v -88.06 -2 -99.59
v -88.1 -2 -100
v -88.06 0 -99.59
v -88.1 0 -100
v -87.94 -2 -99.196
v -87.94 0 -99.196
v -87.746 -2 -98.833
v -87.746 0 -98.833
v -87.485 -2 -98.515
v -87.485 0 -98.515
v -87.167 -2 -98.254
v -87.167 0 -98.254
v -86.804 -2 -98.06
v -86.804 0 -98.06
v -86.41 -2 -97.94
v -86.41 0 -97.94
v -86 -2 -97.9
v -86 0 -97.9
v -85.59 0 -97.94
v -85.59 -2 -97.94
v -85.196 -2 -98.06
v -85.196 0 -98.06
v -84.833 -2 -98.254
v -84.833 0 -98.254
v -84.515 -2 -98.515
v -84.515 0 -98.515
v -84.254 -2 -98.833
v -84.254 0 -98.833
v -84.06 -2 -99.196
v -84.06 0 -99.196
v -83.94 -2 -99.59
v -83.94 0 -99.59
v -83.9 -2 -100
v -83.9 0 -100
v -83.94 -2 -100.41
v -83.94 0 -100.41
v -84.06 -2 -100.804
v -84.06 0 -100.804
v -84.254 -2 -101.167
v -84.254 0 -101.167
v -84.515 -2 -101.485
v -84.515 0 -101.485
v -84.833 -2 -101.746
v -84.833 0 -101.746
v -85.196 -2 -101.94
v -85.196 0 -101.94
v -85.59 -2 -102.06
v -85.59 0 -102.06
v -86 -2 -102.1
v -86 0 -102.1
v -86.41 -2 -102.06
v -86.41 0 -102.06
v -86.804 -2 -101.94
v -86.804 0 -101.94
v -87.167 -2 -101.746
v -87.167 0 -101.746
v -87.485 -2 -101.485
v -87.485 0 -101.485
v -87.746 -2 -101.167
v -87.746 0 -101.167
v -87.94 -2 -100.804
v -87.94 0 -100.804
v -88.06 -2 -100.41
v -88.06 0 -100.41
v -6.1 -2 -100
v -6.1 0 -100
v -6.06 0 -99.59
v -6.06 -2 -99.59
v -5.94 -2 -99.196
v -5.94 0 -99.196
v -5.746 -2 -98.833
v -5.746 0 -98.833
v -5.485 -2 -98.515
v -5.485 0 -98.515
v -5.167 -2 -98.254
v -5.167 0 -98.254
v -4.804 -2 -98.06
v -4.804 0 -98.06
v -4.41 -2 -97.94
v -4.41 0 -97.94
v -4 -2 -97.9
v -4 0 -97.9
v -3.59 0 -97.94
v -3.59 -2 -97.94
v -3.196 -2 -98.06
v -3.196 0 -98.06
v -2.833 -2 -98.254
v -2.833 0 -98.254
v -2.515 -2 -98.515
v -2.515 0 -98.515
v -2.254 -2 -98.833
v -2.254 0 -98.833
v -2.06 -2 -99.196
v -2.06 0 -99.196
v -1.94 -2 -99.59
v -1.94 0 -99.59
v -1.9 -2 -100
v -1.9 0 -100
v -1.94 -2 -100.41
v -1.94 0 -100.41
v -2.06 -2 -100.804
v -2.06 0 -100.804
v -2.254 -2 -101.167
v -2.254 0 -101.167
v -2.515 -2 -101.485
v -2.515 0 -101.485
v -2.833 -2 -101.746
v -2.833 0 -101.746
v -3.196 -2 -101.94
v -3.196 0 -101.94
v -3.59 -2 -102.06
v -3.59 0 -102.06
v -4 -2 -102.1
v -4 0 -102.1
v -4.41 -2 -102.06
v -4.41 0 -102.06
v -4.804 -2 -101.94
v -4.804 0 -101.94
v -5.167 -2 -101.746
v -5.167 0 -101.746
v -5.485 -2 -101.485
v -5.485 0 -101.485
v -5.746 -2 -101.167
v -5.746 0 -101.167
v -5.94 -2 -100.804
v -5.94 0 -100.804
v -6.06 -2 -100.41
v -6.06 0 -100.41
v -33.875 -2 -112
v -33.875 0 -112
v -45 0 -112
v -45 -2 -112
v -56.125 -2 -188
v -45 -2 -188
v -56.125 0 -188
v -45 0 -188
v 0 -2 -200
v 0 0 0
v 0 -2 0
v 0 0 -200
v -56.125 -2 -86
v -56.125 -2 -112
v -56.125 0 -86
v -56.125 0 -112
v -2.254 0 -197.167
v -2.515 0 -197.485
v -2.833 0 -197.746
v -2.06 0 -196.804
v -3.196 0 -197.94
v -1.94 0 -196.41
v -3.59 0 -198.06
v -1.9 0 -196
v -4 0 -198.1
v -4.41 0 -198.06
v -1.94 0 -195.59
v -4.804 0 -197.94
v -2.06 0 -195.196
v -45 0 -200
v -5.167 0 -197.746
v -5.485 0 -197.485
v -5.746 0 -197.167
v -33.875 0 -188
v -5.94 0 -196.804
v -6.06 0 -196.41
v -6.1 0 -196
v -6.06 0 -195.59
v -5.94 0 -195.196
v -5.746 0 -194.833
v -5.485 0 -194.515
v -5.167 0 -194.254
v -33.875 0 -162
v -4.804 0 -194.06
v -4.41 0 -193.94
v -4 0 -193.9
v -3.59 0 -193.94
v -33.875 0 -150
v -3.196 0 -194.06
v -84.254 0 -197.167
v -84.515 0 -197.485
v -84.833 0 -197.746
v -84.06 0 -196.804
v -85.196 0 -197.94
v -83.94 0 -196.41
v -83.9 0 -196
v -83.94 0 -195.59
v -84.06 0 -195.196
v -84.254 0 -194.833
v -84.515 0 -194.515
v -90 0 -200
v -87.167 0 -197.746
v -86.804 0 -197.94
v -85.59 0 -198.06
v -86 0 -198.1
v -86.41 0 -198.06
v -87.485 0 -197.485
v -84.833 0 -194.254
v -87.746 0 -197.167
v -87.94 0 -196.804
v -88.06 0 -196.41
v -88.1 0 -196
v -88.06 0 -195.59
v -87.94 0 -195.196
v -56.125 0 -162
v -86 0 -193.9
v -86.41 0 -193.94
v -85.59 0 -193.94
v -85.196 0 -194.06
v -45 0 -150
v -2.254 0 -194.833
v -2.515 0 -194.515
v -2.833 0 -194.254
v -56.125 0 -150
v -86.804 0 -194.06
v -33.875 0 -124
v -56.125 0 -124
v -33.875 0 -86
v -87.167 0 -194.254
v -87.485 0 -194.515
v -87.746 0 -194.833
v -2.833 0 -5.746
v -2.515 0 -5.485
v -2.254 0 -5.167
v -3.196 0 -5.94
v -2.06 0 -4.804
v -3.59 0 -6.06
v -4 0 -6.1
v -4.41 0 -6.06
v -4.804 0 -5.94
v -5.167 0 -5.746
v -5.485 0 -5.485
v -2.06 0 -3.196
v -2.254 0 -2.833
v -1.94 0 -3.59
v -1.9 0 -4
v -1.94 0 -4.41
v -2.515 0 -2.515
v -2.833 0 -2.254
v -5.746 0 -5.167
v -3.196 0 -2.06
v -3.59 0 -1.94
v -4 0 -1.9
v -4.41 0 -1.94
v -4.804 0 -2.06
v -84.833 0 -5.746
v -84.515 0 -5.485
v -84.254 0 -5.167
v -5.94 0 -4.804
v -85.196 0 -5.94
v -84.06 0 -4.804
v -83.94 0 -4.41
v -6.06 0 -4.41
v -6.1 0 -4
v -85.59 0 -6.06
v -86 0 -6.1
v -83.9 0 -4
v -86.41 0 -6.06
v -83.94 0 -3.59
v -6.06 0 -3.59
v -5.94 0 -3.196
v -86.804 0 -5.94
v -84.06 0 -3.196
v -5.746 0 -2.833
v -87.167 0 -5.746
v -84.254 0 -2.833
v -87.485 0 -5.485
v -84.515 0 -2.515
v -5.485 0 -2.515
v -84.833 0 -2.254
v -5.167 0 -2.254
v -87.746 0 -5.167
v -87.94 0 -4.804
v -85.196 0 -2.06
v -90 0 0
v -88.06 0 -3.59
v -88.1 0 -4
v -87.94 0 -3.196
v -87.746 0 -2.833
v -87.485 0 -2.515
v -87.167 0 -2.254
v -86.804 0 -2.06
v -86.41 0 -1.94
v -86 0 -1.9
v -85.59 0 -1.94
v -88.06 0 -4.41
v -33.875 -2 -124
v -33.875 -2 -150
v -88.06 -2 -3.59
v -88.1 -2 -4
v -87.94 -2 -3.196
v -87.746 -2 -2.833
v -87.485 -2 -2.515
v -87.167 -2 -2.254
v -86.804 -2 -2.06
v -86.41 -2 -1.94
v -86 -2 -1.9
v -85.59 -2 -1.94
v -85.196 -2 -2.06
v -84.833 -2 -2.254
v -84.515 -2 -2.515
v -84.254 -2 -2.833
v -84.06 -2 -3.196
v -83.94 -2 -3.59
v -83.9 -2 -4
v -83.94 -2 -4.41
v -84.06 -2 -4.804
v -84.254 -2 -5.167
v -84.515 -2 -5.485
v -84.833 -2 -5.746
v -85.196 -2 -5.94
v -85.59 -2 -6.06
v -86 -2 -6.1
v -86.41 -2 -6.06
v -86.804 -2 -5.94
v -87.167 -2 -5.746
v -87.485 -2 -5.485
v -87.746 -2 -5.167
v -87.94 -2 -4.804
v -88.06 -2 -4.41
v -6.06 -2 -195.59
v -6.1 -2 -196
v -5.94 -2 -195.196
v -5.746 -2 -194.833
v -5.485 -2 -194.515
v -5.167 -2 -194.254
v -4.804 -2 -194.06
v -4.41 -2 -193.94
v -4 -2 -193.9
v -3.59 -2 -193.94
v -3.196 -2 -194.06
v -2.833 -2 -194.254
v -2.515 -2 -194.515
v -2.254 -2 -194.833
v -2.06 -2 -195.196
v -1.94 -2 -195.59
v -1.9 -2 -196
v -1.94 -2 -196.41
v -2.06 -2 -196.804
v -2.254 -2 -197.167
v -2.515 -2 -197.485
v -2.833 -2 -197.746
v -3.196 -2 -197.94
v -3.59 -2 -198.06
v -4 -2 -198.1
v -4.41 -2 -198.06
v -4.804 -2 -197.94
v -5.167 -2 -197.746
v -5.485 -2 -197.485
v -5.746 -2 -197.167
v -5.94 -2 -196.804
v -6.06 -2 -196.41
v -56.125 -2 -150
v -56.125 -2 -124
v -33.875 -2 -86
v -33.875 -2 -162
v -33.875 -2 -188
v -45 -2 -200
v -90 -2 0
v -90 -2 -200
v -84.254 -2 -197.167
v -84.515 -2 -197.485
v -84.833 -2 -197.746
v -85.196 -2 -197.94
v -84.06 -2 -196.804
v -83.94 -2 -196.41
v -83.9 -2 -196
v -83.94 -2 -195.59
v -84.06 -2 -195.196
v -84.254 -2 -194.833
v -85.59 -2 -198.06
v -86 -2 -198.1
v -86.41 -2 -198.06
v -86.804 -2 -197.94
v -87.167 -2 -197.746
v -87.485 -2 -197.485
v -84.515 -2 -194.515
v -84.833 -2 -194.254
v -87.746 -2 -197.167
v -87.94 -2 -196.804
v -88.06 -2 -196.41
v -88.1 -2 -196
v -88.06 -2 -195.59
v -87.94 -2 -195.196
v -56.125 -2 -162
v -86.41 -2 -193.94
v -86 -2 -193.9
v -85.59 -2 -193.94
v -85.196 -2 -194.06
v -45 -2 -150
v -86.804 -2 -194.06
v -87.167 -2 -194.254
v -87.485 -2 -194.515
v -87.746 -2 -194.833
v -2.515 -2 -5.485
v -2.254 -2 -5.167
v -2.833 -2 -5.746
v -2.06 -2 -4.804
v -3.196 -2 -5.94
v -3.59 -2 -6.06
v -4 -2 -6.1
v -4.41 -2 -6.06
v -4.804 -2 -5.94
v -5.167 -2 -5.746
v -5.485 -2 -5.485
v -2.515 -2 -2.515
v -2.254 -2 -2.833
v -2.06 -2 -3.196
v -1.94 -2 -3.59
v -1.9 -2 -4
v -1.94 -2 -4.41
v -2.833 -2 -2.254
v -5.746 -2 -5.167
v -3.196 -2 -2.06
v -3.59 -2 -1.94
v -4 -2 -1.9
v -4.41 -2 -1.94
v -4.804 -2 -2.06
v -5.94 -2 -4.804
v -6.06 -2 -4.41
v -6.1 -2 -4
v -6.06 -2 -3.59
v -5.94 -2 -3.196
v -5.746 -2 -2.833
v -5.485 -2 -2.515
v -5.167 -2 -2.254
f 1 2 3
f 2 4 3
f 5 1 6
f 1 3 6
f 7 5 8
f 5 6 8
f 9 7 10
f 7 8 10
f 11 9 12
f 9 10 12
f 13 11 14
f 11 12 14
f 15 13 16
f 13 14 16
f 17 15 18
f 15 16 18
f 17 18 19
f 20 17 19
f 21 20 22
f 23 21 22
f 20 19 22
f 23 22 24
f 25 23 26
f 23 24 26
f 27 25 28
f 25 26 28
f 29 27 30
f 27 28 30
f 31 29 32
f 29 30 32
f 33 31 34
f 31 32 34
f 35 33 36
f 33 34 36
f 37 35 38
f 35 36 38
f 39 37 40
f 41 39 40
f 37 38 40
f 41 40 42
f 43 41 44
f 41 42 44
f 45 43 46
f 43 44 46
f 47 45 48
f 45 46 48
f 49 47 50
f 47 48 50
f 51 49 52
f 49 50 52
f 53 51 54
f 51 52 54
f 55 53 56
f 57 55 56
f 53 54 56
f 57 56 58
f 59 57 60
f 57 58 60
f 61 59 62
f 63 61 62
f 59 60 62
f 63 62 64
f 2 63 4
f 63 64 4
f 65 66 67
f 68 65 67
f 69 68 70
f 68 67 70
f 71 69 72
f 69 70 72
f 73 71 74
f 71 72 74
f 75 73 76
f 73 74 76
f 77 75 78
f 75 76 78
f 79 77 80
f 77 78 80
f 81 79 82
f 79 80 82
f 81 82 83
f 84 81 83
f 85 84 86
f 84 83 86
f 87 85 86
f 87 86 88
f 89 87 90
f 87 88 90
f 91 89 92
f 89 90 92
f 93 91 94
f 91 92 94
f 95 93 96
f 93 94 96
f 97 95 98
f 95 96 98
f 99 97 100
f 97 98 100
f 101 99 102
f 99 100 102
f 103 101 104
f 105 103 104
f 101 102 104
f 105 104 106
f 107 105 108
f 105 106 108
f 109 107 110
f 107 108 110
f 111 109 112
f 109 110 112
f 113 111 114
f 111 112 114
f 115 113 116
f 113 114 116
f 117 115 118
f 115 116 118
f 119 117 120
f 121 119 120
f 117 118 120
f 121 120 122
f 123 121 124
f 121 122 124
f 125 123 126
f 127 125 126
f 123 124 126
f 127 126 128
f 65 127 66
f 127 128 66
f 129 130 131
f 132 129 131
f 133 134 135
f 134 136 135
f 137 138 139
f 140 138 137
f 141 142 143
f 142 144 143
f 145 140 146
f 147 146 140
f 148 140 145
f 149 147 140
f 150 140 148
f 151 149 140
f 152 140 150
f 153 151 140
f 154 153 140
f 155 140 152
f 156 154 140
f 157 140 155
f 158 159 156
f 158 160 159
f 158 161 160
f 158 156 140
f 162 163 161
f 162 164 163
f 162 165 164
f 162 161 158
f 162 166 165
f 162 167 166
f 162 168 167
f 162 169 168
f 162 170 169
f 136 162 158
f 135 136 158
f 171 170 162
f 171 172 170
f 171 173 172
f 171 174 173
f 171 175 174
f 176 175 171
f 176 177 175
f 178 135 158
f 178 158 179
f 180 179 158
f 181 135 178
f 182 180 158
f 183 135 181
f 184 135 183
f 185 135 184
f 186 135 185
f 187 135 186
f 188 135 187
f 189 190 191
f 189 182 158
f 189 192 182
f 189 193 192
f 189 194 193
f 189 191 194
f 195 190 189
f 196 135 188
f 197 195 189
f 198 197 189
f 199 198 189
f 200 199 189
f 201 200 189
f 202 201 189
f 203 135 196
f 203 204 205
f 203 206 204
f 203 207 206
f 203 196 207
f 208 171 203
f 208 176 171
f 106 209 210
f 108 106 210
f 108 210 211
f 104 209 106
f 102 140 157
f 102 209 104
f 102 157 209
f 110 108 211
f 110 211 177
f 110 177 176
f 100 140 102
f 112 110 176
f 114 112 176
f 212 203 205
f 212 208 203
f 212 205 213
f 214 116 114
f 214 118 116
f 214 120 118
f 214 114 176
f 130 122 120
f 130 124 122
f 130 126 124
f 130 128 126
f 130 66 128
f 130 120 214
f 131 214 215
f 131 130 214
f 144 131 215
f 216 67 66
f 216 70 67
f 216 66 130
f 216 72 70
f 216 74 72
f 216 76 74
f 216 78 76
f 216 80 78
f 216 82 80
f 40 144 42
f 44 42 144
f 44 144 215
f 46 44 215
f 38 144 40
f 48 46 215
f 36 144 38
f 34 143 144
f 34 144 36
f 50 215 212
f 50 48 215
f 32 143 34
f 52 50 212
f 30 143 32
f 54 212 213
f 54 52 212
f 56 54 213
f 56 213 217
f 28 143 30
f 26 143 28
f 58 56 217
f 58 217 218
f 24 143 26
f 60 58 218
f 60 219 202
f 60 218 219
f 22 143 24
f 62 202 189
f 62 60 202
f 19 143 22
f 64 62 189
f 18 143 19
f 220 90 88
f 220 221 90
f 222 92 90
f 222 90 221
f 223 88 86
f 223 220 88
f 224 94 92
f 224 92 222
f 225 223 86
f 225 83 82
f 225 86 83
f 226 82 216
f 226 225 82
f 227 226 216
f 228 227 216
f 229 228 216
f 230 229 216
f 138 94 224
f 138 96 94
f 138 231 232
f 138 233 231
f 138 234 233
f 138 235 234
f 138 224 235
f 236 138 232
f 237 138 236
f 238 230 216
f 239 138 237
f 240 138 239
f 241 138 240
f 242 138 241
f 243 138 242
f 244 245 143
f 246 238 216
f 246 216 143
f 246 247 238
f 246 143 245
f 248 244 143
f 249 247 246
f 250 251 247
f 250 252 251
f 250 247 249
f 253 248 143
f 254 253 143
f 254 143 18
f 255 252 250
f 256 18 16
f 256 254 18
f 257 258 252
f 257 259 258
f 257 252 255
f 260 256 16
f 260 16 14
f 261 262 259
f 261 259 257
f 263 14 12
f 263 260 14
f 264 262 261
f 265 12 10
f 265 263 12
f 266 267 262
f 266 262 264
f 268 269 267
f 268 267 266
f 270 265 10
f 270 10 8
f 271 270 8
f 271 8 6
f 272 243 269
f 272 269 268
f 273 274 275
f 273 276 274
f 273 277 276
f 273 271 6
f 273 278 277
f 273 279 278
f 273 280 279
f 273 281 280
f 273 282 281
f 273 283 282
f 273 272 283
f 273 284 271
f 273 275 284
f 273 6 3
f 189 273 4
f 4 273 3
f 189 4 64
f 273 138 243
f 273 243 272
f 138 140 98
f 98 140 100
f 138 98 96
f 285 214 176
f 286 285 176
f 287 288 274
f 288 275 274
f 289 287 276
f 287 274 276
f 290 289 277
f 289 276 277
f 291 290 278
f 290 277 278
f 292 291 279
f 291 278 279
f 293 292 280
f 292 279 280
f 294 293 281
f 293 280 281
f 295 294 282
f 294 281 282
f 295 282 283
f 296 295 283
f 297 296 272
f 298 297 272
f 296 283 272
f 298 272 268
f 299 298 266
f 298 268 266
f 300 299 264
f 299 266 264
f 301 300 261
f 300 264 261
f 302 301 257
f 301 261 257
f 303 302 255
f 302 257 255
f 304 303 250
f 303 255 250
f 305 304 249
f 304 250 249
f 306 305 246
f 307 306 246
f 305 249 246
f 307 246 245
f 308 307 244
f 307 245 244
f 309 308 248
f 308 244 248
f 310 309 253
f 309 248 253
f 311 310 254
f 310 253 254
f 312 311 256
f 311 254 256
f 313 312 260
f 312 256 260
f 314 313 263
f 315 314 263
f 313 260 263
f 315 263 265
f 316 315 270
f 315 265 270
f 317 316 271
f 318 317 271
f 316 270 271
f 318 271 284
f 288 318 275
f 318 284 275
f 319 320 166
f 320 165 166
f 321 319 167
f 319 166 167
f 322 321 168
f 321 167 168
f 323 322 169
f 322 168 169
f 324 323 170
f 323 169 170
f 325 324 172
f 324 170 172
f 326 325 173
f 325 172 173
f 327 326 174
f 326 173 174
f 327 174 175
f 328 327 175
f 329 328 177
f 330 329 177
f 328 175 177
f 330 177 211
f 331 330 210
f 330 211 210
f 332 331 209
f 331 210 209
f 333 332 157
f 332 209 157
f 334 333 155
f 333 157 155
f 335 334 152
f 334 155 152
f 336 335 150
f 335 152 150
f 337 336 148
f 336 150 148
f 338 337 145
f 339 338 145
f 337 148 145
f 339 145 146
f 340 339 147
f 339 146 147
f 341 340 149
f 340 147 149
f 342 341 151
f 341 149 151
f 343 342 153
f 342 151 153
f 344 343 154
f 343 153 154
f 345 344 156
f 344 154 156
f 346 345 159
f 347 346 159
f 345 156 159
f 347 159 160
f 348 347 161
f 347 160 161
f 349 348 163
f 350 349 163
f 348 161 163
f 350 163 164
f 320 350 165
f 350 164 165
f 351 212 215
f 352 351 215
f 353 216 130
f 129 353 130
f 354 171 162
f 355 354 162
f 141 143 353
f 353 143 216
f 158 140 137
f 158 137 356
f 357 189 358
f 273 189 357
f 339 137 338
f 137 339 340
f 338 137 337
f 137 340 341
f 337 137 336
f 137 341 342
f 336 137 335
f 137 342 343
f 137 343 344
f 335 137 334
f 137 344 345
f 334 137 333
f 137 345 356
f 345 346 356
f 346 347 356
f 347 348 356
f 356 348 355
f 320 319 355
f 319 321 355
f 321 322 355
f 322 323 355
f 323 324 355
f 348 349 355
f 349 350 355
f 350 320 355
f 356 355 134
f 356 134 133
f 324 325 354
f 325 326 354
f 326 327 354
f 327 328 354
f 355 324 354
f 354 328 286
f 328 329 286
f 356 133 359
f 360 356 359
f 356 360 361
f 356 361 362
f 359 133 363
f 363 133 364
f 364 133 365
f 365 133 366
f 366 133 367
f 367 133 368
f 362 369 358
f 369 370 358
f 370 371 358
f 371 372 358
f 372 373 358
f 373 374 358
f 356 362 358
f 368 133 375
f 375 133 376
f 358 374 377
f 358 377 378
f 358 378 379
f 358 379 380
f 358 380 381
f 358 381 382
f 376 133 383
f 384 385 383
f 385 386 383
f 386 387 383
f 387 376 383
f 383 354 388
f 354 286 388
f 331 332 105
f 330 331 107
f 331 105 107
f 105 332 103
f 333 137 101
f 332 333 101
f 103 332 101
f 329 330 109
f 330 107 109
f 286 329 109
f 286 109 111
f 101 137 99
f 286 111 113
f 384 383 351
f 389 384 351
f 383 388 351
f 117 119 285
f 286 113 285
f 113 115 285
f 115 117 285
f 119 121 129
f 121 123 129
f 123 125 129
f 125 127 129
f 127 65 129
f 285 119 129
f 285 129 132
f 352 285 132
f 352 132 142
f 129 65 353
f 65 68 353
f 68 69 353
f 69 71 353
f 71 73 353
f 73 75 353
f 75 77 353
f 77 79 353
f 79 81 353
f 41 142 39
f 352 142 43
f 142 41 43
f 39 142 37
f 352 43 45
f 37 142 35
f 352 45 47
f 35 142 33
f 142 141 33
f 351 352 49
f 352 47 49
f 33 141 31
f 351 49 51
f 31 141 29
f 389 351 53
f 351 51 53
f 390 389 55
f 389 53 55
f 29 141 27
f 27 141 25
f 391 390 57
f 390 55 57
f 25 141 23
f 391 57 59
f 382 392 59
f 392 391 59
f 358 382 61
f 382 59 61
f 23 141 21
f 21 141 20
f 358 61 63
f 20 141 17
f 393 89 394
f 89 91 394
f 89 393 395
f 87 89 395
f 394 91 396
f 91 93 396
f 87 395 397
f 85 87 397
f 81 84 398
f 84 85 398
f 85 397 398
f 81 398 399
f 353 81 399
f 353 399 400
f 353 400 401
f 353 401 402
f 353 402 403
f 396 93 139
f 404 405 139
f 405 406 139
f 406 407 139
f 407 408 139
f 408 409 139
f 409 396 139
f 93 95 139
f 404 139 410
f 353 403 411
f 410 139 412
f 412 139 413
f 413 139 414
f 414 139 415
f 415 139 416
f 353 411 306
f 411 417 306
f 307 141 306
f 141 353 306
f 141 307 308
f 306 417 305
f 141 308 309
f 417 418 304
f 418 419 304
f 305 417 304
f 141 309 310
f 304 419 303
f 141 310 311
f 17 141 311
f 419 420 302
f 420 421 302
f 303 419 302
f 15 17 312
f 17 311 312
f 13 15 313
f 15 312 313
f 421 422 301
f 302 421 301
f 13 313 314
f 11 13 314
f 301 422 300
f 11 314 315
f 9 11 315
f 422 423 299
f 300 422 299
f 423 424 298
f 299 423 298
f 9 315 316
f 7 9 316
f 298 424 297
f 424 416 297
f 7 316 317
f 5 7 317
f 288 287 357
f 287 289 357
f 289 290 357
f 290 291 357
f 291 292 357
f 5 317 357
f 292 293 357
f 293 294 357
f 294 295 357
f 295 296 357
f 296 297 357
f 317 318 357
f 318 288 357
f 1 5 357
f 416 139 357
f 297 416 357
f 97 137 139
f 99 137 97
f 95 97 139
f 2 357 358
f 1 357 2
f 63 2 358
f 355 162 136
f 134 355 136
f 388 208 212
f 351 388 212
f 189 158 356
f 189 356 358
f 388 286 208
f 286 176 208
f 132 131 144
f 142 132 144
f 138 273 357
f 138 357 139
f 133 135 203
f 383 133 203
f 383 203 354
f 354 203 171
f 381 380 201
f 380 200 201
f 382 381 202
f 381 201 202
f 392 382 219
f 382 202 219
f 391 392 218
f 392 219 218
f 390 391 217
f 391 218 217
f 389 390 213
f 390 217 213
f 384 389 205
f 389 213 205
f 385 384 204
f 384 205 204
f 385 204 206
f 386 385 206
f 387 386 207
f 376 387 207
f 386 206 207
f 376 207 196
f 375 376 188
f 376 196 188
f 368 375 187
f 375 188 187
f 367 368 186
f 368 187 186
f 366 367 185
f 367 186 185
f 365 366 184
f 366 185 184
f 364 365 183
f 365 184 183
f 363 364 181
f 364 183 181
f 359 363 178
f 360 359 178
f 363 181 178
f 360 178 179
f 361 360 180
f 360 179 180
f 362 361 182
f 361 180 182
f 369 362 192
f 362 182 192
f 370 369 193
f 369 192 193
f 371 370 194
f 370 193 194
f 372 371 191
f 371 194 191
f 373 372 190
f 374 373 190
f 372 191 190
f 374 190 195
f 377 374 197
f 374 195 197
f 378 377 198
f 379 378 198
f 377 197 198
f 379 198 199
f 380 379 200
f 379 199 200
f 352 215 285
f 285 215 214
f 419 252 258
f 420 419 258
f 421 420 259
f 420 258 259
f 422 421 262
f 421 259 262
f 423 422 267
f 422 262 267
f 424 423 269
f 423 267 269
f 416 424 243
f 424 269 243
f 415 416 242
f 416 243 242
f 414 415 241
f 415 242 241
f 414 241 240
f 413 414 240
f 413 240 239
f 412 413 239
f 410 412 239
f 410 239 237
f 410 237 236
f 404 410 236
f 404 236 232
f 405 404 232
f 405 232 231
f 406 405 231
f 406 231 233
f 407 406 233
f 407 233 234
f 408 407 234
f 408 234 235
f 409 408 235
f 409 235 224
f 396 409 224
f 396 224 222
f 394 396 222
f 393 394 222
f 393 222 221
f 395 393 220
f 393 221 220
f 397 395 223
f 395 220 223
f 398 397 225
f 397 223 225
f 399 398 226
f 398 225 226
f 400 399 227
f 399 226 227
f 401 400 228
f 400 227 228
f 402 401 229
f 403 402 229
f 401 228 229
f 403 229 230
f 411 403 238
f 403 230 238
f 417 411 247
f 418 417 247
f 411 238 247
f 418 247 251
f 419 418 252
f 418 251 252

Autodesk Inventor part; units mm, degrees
ref_plane "YZ Plane" through (0, 0, 0) normal (1, 0, 0) x (0, 1, 0)
ref_plane "XZ Plane" through (0, 0, 0) normal (0, 1, 0) x (-1, 0, 0)
ref_plane "XY Plane" through (0, 0, 0) normal (0, 0, 1) x (1, 0, 0)
sketch "Sketch1" plane through (0, 0, 0) normal (0, 1, 0) x (-1, 0, 0)
  line L0 (0, 0) -> (0, -200)
  line L1 (0, -200) -> (90, -200)
  line L2 (90, -200) -> (90, 0)
  line L3 (90, 0) -> (0, 0)
  line L4 (45, -200) -> (45, -188)
  line L5 (45, -188) -> (56.125, -188)
  line L6 (56.125, -188) -> (56.125, -162)
  line L7 (56.125, -162) -> (33.875, -162)
  line L8 (33.875, -162) -> (33.875, -188)
  line L9 (33.875, -188) -> (45, -188)
  line L10 (45, -150) -> (56.125, -150)
  line L11 (56.125, -150) -> (56.125, -124)
  line L12 (56.125, -124) -> (33.875, -124)
  line L13 (33.875, -124) -> (33.875, -150)
  line L14 (33.875, -150) -> (45, -150)
  line L15 (45, -112) -> (56.125, -112)
  line L16 (56.125, -112) -> (56.125, -86)
  line L17 (56.125, -86) -> (33.875, -86)
  line L18 (33.875, -86) -> (33.875, -112)
  line L19 (33.875, -112) -> (45, -112)
  circle A0 centre (86, -4) radius 2.1
  circle A1 centre (86, -100) radius 2.1
  circle A2 centre (86, -196) radius 2.1
  circle A3 centre (4, -4) radius 2.1
  circle A4 centre (4, -100) radius 2.1
  circle A5 centre (4, -196) radius 2.1
  dimension "d0" = 200
  dimension "d1" = 90
  dimension "d2" = 200
  dimension "d3" = 12
  dimension "d4" = 11.125
  dimension "d5" = 26
  dimension "d6" = 22.25
  dimension "d7" = 26
  dimension "d9" = 11.125
  dimension "d10" = 26
  dimension "d11" = 22.25
  dimension "d12" = 26
  dimension "d14" = 11.125
  dimension "d15" = 26
  dimension "d16" = 22.25
  dimension "d17" = 26
  dimension "d23" = 4.2
  dimension "d25" = 4.2
extrude "Extrusion1" add sketch "Sketch1" against normal blind 2
properties part number "Cover Rev 4"
